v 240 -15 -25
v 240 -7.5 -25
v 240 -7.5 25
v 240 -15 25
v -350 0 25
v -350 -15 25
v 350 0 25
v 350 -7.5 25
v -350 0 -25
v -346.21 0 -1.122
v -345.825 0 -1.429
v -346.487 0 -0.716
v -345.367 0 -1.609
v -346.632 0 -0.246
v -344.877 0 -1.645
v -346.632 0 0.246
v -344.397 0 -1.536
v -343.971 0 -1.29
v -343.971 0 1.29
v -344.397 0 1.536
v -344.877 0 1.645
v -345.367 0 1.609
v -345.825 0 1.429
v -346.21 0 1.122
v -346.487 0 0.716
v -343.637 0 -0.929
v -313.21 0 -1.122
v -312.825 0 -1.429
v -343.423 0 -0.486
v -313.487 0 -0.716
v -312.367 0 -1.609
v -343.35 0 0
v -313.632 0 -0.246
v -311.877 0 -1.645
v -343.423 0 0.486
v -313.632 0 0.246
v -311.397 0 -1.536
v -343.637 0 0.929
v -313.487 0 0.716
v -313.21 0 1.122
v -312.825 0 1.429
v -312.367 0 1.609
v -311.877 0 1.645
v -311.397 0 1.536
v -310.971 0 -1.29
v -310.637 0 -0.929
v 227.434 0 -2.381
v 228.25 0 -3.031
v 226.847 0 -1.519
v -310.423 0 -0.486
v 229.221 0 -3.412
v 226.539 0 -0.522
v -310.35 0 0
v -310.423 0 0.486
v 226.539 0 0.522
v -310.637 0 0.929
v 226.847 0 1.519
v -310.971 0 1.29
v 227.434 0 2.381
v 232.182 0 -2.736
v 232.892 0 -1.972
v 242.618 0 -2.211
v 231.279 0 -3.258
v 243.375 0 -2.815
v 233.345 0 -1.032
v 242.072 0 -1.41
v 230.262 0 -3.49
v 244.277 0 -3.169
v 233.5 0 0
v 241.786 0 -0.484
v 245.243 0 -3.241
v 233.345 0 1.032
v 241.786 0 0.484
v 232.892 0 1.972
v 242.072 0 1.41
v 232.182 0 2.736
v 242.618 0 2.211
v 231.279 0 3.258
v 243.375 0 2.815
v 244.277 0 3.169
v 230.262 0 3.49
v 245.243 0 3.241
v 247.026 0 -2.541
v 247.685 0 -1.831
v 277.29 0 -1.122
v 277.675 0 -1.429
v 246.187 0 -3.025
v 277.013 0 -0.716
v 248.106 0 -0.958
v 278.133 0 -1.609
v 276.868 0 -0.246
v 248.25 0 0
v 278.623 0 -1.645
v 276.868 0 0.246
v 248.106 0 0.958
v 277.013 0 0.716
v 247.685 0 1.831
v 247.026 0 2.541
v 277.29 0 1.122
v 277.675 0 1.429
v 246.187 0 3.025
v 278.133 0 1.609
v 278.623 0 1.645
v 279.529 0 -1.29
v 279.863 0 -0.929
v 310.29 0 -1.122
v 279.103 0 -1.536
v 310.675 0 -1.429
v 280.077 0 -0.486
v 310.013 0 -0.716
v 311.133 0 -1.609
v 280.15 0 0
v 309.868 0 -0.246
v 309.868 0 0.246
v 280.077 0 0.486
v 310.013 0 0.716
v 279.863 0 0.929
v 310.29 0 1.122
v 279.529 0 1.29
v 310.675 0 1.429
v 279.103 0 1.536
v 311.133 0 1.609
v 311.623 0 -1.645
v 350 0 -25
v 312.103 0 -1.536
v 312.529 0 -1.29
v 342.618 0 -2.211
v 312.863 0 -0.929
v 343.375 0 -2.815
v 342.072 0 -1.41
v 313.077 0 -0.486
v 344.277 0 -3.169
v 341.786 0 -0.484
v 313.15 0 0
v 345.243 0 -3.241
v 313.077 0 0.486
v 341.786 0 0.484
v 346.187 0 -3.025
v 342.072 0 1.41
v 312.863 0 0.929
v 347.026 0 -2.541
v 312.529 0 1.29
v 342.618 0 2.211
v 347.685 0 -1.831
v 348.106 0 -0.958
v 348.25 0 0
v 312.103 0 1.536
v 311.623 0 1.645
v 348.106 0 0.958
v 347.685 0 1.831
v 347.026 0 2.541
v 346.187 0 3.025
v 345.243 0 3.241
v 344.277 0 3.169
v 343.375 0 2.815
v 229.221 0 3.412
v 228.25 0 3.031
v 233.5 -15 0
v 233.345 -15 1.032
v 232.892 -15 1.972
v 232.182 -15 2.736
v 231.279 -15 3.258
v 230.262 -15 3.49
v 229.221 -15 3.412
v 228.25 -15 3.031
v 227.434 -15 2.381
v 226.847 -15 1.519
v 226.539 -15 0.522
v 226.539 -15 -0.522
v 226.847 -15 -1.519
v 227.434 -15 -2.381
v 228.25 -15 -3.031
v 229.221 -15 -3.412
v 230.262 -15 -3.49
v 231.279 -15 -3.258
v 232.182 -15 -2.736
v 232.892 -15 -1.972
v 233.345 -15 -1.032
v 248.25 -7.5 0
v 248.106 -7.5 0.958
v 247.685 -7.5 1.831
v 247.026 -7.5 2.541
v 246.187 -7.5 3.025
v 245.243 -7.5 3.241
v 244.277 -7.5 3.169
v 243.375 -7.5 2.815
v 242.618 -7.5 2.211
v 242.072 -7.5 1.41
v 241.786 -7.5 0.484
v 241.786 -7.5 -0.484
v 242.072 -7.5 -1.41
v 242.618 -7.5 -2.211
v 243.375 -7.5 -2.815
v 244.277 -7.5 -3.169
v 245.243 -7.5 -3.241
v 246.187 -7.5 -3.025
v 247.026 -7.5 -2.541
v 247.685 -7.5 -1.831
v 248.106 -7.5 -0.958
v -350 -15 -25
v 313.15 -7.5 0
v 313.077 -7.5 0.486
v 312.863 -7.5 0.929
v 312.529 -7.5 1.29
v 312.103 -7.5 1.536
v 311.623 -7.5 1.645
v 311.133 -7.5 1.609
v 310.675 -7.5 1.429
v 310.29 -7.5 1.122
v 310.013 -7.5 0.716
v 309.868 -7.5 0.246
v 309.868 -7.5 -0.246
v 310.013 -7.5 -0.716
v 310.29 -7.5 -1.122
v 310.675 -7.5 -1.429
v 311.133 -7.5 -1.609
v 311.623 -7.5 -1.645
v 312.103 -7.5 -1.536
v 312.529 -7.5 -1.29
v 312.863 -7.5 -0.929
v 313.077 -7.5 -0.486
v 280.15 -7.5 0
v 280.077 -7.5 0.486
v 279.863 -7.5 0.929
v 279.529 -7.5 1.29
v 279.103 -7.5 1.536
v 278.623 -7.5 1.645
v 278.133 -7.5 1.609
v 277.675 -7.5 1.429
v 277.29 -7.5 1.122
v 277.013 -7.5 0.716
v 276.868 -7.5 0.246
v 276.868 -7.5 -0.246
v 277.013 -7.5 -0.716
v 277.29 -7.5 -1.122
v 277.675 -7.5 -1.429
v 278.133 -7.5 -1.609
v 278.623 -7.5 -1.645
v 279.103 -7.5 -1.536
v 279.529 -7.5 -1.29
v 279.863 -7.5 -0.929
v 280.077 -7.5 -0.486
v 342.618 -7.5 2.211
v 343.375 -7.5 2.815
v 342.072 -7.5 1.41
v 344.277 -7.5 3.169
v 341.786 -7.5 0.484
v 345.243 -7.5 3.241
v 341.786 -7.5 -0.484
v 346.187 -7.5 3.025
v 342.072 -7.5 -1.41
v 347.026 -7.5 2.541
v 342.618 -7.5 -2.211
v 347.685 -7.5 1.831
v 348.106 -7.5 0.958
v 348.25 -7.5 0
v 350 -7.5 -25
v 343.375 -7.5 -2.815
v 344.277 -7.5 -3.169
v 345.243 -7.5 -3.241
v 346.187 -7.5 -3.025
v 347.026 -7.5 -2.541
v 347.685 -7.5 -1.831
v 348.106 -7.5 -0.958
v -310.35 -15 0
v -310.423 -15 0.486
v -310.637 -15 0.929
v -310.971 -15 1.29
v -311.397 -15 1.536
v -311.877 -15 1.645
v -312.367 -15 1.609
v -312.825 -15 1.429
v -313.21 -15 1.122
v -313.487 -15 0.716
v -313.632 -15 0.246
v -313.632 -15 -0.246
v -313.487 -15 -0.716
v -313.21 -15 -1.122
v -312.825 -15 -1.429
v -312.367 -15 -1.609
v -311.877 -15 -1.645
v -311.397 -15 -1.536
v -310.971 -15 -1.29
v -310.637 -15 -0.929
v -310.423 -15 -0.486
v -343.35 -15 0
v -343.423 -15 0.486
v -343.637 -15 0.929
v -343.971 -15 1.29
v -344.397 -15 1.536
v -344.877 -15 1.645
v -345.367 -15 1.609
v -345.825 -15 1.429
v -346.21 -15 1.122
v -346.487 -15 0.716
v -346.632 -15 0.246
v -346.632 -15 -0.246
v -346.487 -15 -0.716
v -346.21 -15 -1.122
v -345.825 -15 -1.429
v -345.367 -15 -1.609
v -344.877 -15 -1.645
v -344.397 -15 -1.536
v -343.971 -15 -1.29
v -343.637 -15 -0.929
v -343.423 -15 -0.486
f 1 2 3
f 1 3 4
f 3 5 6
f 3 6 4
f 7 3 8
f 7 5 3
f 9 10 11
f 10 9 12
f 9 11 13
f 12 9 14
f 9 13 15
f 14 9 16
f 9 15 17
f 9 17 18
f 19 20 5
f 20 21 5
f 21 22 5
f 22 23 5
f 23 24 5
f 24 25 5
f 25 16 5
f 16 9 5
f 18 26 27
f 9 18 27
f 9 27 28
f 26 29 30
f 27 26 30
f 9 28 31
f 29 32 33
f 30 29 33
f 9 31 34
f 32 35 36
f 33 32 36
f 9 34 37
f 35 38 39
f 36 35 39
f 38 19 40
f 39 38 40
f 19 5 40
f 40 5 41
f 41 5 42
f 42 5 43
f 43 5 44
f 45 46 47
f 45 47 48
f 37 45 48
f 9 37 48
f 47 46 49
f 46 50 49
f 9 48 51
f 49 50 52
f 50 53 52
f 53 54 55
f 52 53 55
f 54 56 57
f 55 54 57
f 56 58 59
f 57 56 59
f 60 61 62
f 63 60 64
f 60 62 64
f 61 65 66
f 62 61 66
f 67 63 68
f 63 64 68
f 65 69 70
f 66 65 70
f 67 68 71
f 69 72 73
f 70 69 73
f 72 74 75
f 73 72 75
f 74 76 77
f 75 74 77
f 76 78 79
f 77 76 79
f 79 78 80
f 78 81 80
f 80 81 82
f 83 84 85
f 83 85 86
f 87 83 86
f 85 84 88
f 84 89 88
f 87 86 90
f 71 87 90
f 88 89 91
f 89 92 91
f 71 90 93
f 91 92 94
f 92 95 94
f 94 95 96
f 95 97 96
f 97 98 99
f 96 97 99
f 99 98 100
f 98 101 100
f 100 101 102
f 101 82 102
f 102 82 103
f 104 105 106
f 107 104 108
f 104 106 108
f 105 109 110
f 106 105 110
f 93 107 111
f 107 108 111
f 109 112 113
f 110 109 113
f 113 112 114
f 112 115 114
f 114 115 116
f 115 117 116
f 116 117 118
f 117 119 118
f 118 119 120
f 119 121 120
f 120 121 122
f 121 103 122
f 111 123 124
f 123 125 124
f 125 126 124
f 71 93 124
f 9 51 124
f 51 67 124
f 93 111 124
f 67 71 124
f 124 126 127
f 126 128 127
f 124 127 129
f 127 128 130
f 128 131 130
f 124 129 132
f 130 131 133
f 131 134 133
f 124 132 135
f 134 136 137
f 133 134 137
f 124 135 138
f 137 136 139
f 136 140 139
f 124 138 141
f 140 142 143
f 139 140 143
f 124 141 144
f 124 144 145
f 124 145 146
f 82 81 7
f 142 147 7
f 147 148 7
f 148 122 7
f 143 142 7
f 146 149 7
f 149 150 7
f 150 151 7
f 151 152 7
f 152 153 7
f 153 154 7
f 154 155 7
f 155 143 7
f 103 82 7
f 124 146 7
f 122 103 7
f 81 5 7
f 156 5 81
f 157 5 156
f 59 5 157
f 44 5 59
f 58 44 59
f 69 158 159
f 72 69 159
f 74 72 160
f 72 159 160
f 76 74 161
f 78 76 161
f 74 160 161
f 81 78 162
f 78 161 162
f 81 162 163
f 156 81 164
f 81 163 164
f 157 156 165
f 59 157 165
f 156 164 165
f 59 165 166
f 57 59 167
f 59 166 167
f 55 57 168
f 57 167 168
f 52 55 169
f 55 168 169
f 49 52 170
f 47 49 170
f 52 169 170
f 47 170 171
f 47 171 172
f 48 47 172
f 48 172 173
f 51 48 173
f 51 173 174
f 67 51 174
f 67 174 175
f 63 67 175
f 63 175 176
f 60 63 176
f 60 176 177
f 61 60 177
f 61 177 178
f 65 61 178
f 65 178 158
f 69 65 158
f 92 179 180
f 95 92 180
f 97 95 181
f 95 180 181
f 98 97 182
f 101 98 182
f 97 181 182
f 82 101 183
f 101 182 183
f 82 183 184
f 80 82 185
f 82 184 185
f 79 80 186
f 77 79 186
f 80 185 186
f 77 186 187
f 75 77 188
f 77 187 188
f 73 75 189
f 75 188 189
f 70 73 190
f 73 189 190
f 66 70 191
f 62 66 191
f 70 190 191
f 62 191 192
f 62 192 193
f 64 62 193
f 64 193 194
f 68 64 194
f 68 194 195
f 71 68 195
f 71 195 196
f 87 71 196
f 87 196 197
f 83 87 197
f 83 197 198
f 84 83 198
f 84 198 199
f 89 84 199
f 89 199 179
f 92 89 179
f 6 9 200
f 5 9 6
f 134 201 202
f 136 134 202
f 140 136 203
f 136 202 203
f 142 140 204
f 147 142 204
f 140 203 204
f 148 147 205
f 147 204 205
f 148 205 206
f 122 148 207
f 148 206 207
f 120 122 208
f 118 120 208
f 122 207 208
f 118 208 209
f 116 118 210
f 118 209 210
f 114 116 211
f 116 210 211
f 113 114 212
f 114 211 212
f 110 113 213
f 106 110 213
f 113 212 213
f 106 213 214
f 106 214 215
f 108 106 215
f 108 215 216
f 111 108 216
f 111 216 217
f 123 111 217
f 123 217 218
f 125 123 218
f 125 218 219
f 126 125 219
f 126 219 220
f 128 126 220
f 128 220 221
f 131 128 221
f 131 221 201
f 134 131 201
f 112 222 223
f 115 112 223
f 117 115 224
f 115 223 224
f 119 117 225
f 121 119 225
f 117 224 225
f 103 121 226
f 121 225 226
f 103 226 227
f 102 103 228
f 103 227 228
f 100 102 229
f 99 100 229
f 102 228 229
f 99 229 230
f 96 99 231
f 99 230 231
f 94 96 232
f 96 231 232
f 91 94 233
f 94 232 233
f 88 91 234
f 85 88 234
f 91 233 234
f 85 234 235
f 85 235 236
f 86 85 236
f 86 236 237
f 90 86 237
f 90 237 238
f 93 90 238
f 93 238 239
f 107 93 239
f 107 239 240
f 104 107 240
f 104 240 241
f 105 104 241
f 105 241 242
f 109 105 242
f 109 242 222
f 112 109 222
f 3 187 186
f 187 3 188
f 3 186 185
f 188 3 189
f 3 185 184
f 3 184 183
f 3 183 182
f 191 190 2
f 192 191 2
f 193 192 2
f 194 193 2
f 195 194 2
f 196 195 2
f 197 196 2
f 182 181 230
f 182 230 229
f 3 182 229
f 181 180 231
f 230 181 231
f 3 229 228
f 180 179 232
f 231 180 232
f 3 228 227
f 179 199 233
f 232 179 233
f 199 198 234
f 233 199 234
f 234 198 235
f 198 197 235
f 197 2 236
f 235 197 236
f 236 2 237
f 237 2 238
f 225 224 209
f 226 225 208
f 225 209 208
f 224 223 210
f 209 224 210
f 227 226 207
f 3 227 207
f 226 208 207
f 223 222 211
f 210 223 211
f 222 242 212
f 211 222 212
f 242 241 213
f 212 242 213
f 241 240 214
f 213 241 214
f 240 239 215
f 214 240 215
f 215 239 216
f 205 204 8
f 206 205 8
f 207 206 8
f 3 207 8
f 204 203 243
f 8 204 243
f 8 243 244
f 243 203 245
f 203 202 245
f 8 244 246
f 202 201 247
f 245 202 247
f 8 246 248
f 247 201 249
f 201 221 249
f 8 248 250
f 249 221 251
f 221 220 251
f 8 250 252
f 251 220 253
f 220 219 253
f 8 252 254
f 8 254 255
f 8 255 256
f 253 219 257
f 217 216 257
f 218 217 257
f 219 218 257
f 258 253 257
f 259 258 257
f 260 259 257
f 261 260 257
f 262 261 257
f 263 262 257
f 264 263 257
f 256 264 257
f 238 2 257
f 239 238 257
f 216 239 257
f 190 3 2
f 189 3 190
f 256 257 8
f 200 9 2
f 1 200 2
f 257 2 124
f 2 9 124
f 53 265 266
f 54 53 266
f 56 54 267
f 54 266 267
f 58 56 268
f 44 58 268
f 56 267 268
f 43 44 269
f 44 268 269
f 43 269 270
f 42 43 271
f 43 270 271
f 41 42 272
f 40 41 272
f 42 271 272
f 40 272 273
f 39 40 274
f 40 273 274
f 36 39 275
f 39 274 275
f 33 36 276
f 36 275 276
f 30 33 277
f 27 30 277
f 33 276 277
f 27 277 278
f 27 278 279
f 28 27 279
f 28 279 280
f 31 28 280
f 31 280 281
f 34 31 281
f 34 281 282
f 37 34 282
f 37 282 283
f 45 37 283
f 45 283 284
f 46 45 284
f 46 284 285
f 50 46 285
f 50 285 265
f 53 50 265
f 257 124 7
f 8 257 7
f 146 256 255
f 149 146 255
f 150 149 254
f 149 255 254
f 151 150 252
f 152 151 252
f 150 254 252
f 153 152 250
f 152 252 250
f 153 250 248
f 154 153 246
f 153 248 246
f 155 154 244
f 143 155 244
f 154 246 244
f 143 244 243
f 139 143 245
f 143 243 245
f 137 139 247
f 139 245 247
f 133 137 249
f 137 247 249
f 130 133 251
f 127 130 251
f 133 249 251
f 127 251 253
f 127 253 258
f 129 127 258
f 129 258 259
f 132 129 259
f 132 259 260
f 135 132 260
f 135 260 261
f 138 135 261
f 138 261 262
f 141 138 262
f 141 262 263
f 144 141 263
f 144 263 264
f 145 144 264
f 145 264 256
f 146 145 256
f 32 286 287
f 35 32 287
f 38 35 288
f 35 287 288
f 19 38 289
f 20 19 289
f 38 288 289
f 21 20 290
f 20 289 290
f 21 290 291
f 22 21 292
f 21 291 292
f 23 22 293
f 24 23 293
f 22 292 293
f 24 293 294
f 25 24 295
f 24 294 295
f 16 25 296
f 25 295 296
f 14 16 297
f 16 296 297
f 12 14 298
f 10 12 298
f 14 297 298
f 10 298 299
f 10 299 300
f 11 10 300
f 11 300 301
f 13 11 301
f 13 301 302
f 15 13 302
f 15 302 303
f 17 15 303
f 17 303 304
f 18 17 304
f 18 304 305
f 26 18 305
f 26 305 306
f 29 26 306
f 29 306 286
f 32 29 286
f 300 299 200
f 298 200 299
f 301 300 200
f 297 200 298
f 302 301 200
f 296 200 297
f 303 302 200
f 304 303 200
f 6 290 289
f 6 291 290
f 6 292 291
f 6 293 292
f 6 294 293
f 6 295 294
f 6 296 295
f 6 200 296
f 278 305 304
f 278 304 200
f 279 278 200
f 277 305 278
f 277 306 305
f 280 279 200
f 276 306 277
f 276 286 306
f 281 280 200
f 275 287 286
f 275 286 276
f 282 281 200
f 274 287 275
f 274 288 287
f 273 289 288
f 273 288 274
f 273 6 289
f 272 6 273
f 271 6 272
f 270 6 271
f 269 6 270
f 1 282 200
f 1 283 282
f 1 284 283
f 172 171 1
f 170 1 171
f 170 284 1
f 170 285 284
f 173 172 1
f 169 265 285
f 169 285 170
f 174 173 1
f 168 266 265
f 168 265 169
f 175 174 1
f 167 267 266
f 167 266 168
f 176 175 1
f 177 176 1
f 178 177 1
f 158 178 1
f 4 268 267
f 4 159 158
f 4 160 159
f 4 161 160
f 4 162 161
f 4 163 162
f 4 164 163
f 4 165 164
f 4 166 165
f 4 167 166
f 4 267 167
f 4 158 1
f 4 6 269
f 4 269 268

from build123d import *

# Parameters (mm, degrees)
F0_W     = 700
F0_H     = 50
F1_DEPTH = 15
F2_W     = 110
F2_H     = 7.5
F3_DEPTH = 50.001
F5_D     = 3.3
F7_D     = 3.3
F9_D     = 7
F11_D    = 6.5


with BuildPart() as f1:
    # F0 (on Front) → F1 (new body)
    with BuildSketch(Plane.XZ):
        Rectangle(F0_W, F0_H)
    extrude(amount=F1_DEPTH)

    # F2 (on face) → F3 (cut, through all)
    with BuildSketch(Plane(origin=(0, 0, -25), x_dir=(1, 0, 0), z_dir=(0, 0, -1))):
        with Locations((295, 11.25)):
            Rectangle(F2_W, F2_H)
    extrude(amount=-F3_DEPTH, mode=Mode.SUBTRACT)

    # F5 (through all)
    with Locations(Plane(origin=(0, 0, 0), x_dir=(-1, 0, 0), z_dir=(0, 1, 0))):
        with Locations((-311.5, 0), (-278.5, 0)):
            Hole(F5_D / 2)

    # F7 (through all)
    with Locations(Plane(origin=(0, 0, 0), x_dir=(-1, 0, 0), z_dir=(0, 1, 0))):
        with Locations((312, 0), (345, 0)):
            Hole(F7_D / 2)

    # F9 (through all)
    with Locations(Plane(origin=(0, 0, 0), x_dir=(-1, 0, 0), z_dir=(0, 1, 0))):
        with Locations((-230, 0)):
            Hole(F9_D / 2)

    # F11 (through all)
    with Locations(Plane(origin=(0, 0, 0), x_dir=(-1, 0, 0), z_dir=(0, 1, 0))):
        with Locations((-345, 0), (-245, 0)):
            Hole(F11_D / 2)


solid = f1.part
